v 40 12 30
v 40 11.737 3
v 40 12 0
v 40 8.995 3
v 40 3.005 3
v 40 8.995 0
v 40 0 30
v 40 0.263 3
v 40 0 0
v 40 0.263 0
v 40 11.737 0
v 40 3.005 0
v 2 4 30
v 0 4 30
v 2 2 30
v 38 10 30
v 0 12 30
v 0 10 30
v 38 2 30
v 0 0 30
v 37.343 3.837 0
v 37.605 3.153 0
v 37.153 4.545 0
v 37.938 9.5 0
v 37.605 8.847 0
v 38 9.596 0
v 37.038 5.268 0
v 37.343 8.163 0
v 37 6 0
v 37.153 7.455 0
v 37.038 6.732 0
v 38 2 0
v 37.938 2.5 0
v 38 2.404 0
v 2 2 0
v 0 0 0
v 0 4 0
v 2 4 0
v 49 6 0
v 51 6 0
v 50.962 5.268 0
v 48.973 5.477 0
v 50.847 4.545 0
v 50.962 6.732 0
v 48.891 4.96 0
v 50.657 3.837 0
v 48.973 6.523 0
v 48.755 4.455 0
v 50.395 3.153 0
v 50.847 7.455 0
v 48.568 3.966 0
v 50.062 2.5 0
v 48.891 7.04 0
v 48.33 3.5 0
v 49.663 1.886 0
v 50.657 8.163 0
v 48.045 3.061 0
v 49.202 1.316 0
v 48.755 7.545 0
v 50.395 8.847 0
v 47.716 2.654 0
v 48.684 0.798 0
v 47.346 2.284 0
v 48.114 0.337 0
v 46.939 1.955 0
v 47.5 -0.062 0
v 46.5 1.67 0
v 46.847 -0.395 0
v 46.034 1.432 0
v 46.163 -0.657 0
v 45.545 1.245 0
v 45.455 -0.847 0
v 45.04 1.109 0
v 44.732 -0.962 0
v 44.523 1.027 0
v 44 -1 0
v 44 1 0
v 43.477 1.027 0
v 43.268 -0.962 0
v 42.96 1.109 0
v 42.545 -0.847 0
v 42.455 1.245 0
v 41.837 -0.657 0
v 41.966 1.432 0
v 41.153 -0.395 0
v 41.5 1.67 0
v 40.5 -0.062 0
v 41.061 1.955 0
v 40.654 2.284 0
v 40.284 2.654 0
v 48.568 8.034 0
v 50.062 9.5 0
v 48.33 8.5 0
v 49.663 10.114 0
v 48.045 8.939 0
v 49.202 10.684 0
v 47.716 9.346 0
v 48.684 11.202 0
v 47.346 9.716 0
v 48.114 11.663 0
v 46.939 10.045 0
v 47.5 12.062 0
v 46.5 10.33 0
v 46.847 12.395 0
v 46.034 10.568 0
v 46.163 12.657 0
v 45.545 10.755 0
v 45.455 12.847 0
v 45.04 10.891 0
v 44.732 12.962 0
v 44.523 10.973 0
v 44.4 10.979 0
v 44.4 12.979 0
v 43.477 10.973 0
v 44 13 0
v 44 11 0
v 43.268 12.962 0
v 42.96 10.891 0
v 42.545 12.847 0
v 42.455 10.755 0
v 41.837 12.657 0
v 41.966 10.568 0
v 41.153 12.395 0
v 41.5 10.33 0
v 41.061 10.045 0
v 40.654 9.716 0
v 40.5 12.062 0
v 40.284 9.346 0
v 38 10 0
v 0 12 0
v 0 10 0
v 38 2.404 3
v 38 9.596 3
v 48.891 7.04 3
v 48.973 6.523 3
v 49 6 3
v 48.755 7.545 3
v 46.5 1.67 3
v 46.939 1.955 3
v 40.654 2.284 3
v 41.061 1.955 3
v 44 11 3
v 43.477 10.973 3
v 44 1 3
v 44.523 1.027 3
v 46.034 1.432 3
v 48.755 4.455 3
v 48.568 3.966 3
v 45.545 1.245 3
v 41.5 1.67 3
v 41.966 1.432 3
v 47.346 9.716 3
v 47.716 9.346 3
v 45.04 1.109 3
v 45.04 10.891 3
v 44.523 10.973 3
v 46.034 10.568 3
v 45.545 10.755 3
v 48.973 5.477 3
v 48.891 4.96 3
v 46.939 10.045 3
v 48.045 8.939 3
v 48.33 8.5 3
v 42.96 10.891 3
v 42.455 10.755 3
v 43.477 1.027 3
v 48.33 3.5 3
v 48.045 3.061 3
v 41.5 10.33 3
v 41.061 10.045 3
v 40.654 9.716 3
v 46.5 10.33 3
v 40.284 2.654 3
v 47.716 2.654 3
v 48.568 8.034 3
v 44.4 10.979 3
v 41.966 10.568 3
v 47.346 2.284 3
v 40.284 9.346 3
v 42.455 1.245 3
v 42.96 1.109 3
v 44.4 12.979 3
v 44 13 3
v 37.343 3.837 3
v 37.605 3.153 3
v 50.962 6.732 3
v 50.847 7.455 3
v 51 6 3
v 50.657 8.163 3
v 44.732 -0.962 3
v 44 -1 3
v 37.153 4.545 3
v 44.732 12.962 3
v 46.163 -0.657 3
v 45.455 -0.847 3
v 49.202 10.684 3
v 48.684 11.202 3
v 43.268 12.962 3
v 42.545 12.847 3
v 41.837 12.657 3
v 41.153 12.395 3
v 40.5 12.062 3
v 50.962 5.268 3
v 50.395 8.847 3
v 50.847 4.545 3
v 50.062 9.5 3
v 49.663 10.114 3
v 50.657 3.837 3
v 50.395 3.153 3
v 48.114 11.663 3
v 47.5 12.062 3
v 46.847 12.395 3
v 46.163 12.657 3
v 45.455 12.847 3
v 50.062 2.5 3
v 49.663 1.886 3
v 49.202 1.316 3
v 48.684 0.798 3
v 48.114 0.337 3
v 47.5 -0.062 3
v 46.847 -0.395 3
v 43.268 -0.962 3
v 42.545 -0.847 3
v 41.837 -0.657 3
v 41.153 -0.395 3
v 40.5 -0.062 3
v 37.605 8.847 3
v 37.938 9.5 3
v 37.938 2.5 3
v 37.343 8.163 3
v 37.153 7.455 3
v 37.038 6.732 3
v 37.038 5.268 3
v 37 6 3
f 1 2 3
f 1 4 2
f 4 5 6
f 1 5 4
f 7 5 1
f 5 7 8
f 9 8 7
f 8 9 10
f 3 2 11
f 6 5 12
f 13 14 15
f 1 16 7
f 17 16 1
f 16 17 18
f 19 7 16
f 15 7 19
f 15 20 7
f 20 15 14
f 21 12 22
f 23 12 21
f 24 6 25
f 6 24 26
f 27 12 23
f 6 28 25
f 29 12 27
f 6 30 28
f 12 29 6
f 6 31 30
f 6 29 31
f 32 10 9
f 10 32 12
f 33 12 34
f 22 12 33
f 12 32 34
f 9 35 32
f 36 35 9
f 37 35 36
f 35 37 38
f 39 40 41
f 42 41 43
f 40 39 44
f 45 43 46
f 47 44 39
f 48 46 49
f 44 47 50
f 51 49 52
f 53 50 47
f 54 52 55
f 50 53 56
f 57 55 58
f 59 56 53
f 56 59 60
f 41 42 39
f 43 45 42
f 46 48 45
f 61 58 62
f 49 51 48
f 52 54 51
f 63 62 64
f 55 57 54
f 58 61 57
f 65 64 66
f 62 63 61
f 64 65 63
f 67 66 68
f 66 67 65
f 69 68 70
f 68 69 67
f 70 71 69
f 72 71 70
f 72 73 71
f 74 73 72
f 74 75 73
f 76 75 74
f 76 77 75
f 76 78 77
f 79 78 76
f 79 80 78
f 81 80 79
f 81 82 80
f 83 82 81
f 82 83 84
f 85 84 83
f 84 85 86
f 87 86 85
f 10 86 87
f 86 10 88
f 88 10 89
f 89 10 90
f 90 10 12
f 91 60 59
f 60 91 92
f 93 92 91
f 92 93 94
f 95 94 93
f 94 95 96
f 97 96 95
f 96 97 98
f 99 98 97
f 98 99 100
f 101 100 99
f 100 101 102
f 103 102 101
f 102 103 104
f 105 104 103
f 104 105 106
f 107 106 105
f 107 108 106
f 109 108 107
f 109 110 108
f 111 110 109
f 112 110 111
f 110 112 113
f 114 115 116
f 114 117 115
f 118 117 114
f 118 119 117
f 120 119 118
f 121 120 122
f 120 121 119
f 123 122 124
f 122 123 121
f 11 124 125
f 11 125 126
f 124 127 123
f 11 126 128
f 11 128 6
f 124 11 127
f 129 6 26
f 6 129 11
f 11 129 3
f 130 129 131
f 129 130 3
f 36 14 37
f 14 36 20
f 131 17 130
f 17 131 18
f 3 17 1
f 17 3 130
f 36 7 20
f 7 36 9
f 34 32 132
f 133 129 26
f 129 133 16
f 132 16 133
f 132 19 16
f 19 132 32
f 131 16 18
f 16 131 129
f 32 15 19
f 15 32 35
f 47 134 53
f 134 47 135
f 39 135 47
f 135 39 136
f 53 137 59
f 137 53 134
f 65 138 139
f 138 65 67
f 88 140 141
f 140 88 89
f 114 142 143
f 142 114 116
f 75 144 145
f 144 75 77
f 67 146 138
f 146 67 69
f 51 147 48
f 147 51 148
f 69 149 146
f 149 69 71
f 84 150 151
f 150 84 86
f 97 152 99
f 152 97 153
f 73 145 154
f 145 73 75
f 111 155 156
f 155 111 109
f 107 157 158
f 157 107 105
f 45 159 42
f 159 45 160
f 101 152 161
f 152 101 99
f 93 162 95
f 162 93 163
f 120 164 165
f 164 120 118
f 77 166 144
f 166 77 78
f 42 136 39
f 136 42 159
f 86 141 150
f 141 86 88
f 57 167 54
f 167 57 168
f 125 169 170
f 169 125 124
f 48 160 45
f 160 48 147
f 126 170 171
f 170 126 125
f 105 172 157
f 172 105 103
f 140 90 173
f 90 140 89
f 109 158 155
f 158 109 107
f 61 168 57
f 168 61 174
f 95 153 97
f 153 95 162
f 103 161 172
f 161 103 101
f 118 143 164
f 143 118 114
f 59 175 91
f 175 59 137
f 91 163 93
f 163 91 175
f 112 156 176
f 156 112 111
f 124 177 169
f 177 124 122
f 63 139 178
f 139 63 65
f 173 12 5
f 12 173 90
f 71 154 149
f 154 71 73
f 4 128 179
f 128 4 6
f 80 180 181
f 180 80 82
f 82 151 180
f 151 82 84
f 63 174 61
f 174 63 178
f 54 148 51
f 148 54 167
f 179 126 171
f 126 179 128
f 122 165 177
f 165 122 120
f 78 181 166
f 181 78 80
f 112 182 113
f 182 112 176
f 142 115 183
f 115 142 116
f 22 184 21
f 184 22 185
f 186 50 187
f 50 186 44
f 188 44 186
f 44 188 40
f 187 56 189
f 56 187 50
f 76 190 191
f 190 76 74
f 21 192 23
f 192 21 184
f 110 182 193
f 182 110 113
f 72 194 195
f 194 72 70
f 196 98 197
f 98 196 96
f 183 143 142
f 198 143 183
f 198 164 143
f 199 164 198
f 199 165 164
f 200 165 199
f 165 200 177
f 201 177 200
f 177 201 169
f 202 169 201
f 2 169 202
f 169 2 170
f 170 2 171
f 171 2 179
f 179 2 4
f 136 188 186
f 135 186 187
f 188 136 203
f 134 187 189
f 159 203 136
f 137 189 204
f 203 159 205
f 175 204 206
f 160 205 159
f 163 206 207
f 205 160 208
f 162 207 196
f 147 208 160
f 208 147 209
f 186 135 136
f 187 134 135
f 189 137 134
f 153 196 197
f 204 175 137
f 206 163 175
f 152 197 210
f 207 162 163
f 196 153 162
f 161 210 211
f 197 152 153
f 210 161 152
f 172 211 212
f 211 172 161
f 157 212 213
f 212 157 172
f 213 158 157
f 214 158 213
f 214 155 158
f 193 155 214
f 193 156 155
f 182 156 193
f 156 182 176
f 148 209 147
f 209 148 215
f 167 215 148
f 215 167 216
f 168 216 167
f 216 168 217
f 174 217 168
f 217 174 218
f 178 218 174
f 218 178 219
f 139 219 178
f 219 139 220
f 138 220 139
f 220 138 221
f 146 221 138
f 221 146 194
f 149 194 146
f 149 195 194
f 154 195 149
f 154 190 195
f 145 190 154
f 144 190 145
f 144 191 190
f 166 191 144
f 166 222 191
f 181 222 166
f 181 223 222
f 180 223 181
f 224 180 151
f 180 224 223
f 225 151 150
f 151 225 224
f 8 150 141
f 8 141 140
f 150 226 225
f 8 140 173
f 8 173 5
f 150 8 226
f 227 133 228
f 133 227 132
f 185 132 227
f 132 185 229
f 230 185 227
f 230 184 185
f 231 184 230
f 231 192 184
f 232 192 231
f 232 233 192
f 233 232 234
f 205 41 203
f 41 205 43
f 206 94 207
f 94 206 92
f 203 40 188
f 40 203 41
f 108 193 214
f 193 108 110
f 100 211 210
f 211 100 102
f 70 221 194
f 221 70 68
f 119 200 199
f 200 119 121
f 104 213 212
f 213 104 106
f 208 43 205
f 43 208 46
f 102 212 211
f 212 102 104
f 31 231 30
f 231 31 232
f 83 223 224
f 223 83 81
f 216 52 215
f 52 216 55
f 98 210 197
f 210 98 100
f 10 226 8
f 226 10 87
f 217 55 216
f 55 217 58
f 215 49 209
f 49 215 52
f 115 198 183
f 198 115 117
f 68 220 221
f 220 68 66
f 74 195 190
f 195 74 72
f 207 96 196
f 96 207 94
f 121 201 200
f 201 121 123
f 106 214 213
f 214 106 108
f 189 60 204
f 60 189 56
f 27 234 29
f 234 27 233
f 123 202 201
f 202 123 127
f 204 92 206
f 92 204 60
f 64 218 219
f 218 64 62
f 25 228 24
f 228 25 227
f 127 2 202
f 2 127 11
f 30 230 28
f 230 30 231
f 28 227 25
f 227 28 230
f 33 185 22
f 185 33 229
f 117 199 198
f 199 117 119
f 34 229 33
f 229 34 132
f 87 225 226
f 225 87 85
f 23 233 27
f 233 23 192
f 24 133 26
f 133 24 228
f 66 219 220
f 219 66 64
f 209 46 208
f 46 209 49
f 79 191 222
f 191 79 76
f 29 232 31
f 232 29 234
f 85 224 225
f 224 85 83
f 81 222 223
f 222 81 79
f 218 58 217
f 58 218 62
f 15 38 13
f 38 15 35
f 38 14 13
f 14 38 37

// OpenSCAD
$fn=60;
width=8; // Thickness of desk
height = 30;  // left to  right
length = 40; // how deep
thickness = 2;
difference()
{
    cube([length,width + thickness *2,height]);
    translate([-thickness,thickness,-1])
    cube([length,width,height+2]);
}    

cube([thickness,thickness *2,height]);

translate([44,width/2 + thickness ,0])
difference()
{
    cylinder(3, d=10 + thickness *2);
    translate([0,0,-1])
    {
        cylinder(4.5, d=10);
                translate([0,width/2,0])
        cube([.4,4,4.5]);
    }
}
